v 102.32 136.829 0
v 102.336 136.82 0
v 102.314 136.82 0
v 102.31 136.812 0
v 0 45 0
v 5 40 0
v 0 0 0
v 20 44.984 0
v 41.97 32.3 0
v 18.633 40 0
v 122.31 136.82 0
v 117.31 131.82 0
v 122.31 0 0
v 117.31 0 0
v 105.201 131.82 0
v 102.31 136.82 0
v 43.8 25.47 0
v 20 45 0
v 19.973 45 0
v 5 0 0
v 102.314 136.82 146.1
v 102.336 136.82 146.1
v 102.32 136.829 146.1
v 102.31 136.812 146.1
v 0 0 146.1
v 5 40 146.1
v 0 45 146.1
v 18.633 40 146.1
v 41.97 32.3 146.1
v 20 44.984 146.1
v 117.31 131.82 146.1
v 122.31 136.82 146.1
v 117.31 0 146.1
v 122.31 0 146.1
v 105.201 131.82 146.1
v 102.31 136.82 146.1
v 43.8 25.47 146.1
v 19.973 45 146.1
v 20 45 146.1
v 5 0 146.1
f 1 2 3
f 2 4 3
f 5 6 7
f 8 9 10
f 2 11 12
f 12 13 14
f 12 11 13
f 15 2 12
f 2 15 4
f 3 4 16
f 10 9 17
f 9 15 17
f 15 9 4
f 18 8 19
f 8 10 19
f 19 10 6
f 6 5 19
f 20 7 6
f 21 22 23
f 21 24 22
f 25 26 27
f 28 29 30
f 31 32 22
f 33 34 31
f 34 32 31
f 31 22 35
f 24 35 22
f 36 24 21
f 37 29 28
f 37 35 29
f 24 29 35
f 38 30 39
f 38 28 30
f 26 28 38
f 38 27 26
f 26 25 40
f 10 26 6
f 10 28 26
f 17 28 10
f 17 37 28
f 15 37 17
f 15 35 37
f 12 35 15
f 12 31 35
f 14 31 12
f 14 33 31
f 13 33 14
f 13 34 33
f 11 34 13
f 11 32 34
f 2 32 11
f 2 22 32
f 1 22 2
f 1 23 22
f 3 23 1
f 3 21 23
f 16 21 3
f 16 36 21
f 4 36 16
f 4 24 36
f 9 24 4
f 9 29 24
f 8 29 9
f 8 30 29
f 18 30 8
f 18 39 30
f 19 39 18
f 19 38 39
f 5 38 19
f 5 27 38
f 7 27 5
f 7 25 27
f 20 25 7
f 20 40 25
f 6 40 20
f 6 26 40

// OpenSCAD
pW = 146.1;
pD = 120.7;
pH = 25.4;

linear_extrude(height = pW) {
union() {
    difference() {
        square([20, 45]);
        translate([5, 0]) square ([20, 40]);
    }
    
    translate([43.8, 25.47])
    rotate([0, 0, 60])
        difference() {
            square([pD + 5, pH + 5]);
            translate([5, 5]) square([pD + 1, pH + 1]);
        }
        
     translate([102.31, 0]) {
         difference() {
            square([20, 136.82]);
            translate([-1, -1]) square([16, 132.82]);
         }
     }
 }
 }
